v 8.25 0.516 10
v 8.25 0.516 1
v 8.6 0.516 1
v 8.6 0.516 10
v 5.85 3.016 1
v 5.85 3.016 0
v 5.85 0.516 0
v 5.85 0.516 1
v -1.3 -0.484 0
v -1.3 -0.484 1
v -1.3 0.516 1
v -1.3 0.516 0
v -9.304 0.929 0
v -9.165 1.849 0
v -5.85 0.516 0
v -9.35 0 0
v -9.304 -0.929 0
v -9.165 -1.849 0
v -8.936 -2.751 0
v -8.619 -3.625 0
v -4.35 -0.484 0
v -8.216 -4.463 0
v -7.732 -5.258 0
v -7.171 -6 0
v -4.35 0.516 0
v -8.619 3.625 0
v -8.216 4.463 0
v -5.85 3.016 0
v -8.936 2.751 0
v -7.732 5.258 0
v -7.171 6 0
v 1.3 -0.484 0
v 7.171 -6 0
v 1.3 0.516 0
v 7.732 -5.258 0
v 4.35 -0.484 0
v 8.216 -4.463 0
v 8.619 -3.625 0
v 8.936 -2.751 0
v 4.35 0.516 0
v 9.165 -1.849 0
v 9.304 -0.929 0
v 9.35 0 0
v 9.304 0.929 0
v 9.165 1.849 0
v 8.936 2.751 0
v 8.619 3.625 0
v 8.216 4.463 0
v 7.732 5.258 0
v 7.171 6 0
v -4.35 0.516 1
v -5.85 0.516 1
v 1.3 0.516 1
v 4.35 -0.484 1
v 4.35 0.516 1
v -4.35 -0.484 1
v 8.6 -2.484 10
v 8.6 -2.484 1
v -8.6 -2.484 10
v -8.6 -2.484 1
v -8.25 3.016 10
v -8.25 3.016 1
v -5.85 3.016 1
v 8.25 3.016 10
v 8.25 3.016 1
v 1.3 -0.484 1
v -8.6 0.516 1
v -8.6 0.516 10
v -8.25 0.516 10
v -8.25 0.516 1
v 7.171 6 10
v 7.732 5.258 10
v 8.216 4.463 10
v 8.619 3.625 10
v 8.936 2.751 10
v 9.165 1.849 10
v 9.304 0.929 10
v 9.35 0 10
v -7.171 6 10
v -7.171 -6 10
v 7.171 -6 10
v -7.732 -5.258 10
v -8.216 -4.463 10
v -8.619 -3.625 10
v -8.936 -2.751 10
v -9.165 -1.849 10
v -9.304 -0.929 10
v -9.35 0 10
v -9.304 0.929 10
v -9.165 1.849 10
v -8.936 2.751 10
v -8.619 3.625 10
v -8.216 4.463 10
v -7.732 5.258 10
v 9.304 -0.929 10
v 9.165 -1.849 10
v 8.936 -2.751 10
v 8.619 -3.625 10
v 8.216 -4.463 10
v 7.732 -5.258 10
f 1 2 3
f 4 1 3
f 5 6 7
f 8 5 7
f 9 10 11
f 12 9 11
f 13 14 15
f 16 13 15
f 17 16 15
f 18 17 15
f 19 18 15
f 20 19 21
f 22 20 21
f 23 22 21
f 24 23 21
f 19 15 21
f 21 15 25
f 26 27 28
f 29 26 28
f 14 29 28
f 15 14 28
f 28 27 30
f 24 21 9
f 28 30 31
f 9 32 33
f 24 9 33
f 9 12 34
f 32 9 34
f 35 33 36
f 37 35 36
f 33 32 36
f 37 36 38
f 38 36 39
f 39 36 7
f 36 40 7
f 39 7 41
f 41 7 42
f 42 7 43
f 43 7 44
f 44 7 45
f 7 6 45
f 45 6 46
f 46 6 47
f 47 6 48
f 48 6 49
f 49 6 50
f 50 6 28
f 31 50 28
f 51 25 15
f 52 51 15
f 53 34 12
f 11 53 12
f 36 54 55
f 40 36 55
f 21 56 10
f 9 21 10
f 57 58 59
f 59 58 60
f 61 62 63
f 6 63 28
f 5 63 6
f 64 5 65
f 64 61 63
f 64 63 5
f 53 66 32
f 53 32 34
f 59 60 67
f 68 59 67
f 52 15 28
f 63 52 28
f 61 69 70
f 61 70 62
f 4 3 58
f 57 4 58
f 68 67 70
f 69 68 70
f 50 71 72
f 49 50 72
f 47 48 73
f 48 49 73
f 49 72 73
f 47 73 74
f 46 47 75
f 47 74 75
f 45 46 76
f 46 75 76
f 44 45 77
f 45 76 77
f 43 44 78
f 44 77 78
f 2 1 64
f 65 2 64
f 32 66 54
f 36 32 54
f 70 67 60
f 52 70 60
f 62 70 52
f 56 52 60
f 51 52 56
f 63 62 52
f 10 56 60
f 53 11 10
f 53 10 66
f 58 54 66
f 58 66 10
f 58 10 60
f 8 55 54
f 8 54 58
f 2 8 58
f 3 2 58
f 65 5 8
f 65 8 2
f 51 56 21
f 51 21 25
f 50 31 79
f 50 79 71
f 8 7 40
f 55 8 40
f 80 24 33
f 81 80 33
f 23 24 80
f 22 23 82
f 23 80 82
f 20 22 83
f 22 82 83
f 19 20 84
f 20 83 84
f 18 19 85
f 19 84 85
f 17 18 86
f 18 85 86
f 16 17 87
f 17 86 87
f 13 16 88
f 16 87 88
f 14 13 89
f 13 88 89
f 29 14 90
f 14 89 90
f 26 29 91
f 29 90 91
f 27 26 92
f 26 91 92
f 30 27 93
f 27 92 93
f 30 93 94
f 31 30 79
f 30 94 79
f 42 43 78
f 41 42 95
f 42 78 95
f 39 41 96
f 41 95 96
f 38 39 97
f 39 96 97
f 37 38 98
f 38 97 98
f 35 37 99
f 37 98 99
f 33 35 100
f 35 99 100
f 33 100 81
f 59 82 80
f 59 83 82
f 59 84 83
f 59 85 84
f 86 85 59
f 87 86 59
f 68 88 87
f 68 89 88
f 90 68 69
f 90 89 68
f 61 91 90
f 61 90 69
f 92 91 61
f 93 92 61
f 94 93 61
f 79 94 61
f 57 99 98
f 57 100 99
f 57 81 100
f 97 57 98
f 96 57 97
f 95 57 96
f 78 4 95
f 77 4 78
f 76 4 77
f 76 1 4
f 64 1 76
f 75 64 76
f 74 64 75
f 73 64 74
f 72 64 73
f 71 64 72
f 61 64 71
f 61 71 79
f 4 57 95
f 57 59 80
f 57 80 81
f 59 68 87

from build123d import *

# Parameters (mm, degrees)
F0_W     = 22
F0_H     = 12
F1_DEPTH = 1
F2_DEPTH = 10
F3_W     = 2.4
F3_H     = 2.5
F4_DEPTH = 9
F5_R     = 2
F6_R     = 12.5
F7_DEPTH = 25
F8_W     = 3.05
F8_H     = 1
F9_DEPTH = 25


with BuildPart() as f1:
    # F0 (on Top) → F1 (new body)
    with BuildSketch(Plane.XY):
        Rectangle(F0_W, F0_H)
        Polygon((-5.85, 3.0159242167), (0, 3.0159242167), (5.85, 3.0159242167), (5.85, 0.5159242167), (8.6, 0.5159242167), (8.6, -2.4840757833), (0, -2.4840757833), (-8.6, -2.4840757833), (-8.6, 0.5159242167), (-5.85, 0.5159242167), align=None, mode=Mode.SUBTRACT)
        Polygon((8.6, 0.5159242167), (5.85, 0.5159242167), (-5.85, 0.5159242167), (-8.6, 0.5159242167), (-8.6, -2.4840757833), (0, -2.4840757833), (8.6, -2.4840757833), align=None)
    extrude(amount=F1_DEPTH)

    # F0 (on Top) → F2 (join)
    with BuildSketch(Plane.XY):
        Rectangle(F0_W, F0_H)
        Polygon((-5.85, 3.0159242167), (0, 3.0159242167), (5.85, 3.0159242167), (5.85, 0.5159242167), (8.6, 0.5159242167), (8.6, -2.4840757833), (0, -2.4840757833), (-8.6, -2.4840757833), (-8.6, 0.5159242167), (-5.85, 0.5159242167), align=None, mode=Mode.SUBTRACT)
    extrude(amount=F2_DEPTH)

    # F3 (on face) → F4 (cut, through all)
    with BuildSketch(Plane.XY.offset(10)):
        with Locations((-7.05, 1.7659242167)):
            Rectangle(F3_W, F3_H)
        with Locations((7.05, 1.7659242167)):
            Rectangle(F3_W, F3_H)
    extrude(amount=-F4_DEPTH, mode=Mode.SUBTRACT)

    # F5
    f5_edges = [f1.edges().sort_by_distance(p)[0] for p in [
        (-11, -6, 5),
        (11, -6, 5),
        (-11, 6, 5),
        (11, 6, 5),
    ]]
    fillet(f5_edges, radius=F5_R)

    # F6 (on face) → F7 (cut)
    with BuildSketch(Plane.XY.offset(10)):
        Circle(F6_R)
        with BuildLine():
            ThreePointArc((-7.1709483334, 6), (0, 9.35), (7.1709483334, 6))
            Line((7.1709483334, 6), (9, 6))
            ThreePointArc((9, 6), (10.4142135624, 5.4142135624), (11, 4))
            Line((11, 4), (11, -4))
            ThreePointArc((11, -4), (10.4142135624, -5.4142135624), (9, -6))
            Line((9, -6), (7.1709483334, -6))
            ThreePointArc((7.1709483334, -6), (0, -9.35), (-7.1709483334, -6))
            Line((-7.1709483334, -6), (-9, -6))
            ThreePointArc((-9, -6), (-10.4142135624, -5.4142135624), (-11, -4))
            Line((-11, -4), (-11, 4))
            ThreePointArc((-11, 4), (-10.4142135624, 5.4142135624), (-9, 6))
            Line((-9, 6), (-7.1709483334, 6))
        make_face(mode=Mode.SUBTRACT)
        with BuildLine():
            ThreePointArc((-7.1709483334, -6), (-9.35, 0), (-7.1709483334, 6))
            Line((-7.1709483334, 6), (-9, 6))
            ThreePointArc((-9, 6), (-10.4142135624, 5.4142135624), (-11, 4))
            Line((-11, 4), (-11, -4))
            ThreePointArc((-11, -4), (-10.4142135624, -5.4142135624), (-9, -6))
            Line((-9, -6), (-7.1709483334, -6))
        make_face()
        with BuildLine():
            ThreePointArc((7.1709483334, 6), (8.788369215, 3.1917184308), (9.35, 0))
            ThreePointArc((9.35, 0), (8.788369215, -3.1917184308), (7.1709483334, -6))
            Line((7.1709483334, -6), (9, -6))
            ThreePointArc((9, -6), (10.4142135624, -5.4142135624), (11, -4))
            Line((11, -4), (11, 4))
            ThreePointArc((11, 4), (10.4142135624, 5.4142135624), (9, 6))
            Line((9, 6), (7.1709483334, 6))
        make_face()
    extrude(amount=-F7_DEPTH, mode=Mode.SUBTRACT)

    # F8 (on face) → F9 (cut)
    with BuildSketch(Plane.XY.offset(1)):
        with Locations((-2.825, 0.0159242167)):
            Rectangle(F8_W, F8_H)
        with Locations((2.825, 0.0159242167)):
            Rectangle(F8_W, F8_H)
    extrude(amount=-F9_DEPTH, mode=Mode.SUBTRACT)


solid = f1.part
